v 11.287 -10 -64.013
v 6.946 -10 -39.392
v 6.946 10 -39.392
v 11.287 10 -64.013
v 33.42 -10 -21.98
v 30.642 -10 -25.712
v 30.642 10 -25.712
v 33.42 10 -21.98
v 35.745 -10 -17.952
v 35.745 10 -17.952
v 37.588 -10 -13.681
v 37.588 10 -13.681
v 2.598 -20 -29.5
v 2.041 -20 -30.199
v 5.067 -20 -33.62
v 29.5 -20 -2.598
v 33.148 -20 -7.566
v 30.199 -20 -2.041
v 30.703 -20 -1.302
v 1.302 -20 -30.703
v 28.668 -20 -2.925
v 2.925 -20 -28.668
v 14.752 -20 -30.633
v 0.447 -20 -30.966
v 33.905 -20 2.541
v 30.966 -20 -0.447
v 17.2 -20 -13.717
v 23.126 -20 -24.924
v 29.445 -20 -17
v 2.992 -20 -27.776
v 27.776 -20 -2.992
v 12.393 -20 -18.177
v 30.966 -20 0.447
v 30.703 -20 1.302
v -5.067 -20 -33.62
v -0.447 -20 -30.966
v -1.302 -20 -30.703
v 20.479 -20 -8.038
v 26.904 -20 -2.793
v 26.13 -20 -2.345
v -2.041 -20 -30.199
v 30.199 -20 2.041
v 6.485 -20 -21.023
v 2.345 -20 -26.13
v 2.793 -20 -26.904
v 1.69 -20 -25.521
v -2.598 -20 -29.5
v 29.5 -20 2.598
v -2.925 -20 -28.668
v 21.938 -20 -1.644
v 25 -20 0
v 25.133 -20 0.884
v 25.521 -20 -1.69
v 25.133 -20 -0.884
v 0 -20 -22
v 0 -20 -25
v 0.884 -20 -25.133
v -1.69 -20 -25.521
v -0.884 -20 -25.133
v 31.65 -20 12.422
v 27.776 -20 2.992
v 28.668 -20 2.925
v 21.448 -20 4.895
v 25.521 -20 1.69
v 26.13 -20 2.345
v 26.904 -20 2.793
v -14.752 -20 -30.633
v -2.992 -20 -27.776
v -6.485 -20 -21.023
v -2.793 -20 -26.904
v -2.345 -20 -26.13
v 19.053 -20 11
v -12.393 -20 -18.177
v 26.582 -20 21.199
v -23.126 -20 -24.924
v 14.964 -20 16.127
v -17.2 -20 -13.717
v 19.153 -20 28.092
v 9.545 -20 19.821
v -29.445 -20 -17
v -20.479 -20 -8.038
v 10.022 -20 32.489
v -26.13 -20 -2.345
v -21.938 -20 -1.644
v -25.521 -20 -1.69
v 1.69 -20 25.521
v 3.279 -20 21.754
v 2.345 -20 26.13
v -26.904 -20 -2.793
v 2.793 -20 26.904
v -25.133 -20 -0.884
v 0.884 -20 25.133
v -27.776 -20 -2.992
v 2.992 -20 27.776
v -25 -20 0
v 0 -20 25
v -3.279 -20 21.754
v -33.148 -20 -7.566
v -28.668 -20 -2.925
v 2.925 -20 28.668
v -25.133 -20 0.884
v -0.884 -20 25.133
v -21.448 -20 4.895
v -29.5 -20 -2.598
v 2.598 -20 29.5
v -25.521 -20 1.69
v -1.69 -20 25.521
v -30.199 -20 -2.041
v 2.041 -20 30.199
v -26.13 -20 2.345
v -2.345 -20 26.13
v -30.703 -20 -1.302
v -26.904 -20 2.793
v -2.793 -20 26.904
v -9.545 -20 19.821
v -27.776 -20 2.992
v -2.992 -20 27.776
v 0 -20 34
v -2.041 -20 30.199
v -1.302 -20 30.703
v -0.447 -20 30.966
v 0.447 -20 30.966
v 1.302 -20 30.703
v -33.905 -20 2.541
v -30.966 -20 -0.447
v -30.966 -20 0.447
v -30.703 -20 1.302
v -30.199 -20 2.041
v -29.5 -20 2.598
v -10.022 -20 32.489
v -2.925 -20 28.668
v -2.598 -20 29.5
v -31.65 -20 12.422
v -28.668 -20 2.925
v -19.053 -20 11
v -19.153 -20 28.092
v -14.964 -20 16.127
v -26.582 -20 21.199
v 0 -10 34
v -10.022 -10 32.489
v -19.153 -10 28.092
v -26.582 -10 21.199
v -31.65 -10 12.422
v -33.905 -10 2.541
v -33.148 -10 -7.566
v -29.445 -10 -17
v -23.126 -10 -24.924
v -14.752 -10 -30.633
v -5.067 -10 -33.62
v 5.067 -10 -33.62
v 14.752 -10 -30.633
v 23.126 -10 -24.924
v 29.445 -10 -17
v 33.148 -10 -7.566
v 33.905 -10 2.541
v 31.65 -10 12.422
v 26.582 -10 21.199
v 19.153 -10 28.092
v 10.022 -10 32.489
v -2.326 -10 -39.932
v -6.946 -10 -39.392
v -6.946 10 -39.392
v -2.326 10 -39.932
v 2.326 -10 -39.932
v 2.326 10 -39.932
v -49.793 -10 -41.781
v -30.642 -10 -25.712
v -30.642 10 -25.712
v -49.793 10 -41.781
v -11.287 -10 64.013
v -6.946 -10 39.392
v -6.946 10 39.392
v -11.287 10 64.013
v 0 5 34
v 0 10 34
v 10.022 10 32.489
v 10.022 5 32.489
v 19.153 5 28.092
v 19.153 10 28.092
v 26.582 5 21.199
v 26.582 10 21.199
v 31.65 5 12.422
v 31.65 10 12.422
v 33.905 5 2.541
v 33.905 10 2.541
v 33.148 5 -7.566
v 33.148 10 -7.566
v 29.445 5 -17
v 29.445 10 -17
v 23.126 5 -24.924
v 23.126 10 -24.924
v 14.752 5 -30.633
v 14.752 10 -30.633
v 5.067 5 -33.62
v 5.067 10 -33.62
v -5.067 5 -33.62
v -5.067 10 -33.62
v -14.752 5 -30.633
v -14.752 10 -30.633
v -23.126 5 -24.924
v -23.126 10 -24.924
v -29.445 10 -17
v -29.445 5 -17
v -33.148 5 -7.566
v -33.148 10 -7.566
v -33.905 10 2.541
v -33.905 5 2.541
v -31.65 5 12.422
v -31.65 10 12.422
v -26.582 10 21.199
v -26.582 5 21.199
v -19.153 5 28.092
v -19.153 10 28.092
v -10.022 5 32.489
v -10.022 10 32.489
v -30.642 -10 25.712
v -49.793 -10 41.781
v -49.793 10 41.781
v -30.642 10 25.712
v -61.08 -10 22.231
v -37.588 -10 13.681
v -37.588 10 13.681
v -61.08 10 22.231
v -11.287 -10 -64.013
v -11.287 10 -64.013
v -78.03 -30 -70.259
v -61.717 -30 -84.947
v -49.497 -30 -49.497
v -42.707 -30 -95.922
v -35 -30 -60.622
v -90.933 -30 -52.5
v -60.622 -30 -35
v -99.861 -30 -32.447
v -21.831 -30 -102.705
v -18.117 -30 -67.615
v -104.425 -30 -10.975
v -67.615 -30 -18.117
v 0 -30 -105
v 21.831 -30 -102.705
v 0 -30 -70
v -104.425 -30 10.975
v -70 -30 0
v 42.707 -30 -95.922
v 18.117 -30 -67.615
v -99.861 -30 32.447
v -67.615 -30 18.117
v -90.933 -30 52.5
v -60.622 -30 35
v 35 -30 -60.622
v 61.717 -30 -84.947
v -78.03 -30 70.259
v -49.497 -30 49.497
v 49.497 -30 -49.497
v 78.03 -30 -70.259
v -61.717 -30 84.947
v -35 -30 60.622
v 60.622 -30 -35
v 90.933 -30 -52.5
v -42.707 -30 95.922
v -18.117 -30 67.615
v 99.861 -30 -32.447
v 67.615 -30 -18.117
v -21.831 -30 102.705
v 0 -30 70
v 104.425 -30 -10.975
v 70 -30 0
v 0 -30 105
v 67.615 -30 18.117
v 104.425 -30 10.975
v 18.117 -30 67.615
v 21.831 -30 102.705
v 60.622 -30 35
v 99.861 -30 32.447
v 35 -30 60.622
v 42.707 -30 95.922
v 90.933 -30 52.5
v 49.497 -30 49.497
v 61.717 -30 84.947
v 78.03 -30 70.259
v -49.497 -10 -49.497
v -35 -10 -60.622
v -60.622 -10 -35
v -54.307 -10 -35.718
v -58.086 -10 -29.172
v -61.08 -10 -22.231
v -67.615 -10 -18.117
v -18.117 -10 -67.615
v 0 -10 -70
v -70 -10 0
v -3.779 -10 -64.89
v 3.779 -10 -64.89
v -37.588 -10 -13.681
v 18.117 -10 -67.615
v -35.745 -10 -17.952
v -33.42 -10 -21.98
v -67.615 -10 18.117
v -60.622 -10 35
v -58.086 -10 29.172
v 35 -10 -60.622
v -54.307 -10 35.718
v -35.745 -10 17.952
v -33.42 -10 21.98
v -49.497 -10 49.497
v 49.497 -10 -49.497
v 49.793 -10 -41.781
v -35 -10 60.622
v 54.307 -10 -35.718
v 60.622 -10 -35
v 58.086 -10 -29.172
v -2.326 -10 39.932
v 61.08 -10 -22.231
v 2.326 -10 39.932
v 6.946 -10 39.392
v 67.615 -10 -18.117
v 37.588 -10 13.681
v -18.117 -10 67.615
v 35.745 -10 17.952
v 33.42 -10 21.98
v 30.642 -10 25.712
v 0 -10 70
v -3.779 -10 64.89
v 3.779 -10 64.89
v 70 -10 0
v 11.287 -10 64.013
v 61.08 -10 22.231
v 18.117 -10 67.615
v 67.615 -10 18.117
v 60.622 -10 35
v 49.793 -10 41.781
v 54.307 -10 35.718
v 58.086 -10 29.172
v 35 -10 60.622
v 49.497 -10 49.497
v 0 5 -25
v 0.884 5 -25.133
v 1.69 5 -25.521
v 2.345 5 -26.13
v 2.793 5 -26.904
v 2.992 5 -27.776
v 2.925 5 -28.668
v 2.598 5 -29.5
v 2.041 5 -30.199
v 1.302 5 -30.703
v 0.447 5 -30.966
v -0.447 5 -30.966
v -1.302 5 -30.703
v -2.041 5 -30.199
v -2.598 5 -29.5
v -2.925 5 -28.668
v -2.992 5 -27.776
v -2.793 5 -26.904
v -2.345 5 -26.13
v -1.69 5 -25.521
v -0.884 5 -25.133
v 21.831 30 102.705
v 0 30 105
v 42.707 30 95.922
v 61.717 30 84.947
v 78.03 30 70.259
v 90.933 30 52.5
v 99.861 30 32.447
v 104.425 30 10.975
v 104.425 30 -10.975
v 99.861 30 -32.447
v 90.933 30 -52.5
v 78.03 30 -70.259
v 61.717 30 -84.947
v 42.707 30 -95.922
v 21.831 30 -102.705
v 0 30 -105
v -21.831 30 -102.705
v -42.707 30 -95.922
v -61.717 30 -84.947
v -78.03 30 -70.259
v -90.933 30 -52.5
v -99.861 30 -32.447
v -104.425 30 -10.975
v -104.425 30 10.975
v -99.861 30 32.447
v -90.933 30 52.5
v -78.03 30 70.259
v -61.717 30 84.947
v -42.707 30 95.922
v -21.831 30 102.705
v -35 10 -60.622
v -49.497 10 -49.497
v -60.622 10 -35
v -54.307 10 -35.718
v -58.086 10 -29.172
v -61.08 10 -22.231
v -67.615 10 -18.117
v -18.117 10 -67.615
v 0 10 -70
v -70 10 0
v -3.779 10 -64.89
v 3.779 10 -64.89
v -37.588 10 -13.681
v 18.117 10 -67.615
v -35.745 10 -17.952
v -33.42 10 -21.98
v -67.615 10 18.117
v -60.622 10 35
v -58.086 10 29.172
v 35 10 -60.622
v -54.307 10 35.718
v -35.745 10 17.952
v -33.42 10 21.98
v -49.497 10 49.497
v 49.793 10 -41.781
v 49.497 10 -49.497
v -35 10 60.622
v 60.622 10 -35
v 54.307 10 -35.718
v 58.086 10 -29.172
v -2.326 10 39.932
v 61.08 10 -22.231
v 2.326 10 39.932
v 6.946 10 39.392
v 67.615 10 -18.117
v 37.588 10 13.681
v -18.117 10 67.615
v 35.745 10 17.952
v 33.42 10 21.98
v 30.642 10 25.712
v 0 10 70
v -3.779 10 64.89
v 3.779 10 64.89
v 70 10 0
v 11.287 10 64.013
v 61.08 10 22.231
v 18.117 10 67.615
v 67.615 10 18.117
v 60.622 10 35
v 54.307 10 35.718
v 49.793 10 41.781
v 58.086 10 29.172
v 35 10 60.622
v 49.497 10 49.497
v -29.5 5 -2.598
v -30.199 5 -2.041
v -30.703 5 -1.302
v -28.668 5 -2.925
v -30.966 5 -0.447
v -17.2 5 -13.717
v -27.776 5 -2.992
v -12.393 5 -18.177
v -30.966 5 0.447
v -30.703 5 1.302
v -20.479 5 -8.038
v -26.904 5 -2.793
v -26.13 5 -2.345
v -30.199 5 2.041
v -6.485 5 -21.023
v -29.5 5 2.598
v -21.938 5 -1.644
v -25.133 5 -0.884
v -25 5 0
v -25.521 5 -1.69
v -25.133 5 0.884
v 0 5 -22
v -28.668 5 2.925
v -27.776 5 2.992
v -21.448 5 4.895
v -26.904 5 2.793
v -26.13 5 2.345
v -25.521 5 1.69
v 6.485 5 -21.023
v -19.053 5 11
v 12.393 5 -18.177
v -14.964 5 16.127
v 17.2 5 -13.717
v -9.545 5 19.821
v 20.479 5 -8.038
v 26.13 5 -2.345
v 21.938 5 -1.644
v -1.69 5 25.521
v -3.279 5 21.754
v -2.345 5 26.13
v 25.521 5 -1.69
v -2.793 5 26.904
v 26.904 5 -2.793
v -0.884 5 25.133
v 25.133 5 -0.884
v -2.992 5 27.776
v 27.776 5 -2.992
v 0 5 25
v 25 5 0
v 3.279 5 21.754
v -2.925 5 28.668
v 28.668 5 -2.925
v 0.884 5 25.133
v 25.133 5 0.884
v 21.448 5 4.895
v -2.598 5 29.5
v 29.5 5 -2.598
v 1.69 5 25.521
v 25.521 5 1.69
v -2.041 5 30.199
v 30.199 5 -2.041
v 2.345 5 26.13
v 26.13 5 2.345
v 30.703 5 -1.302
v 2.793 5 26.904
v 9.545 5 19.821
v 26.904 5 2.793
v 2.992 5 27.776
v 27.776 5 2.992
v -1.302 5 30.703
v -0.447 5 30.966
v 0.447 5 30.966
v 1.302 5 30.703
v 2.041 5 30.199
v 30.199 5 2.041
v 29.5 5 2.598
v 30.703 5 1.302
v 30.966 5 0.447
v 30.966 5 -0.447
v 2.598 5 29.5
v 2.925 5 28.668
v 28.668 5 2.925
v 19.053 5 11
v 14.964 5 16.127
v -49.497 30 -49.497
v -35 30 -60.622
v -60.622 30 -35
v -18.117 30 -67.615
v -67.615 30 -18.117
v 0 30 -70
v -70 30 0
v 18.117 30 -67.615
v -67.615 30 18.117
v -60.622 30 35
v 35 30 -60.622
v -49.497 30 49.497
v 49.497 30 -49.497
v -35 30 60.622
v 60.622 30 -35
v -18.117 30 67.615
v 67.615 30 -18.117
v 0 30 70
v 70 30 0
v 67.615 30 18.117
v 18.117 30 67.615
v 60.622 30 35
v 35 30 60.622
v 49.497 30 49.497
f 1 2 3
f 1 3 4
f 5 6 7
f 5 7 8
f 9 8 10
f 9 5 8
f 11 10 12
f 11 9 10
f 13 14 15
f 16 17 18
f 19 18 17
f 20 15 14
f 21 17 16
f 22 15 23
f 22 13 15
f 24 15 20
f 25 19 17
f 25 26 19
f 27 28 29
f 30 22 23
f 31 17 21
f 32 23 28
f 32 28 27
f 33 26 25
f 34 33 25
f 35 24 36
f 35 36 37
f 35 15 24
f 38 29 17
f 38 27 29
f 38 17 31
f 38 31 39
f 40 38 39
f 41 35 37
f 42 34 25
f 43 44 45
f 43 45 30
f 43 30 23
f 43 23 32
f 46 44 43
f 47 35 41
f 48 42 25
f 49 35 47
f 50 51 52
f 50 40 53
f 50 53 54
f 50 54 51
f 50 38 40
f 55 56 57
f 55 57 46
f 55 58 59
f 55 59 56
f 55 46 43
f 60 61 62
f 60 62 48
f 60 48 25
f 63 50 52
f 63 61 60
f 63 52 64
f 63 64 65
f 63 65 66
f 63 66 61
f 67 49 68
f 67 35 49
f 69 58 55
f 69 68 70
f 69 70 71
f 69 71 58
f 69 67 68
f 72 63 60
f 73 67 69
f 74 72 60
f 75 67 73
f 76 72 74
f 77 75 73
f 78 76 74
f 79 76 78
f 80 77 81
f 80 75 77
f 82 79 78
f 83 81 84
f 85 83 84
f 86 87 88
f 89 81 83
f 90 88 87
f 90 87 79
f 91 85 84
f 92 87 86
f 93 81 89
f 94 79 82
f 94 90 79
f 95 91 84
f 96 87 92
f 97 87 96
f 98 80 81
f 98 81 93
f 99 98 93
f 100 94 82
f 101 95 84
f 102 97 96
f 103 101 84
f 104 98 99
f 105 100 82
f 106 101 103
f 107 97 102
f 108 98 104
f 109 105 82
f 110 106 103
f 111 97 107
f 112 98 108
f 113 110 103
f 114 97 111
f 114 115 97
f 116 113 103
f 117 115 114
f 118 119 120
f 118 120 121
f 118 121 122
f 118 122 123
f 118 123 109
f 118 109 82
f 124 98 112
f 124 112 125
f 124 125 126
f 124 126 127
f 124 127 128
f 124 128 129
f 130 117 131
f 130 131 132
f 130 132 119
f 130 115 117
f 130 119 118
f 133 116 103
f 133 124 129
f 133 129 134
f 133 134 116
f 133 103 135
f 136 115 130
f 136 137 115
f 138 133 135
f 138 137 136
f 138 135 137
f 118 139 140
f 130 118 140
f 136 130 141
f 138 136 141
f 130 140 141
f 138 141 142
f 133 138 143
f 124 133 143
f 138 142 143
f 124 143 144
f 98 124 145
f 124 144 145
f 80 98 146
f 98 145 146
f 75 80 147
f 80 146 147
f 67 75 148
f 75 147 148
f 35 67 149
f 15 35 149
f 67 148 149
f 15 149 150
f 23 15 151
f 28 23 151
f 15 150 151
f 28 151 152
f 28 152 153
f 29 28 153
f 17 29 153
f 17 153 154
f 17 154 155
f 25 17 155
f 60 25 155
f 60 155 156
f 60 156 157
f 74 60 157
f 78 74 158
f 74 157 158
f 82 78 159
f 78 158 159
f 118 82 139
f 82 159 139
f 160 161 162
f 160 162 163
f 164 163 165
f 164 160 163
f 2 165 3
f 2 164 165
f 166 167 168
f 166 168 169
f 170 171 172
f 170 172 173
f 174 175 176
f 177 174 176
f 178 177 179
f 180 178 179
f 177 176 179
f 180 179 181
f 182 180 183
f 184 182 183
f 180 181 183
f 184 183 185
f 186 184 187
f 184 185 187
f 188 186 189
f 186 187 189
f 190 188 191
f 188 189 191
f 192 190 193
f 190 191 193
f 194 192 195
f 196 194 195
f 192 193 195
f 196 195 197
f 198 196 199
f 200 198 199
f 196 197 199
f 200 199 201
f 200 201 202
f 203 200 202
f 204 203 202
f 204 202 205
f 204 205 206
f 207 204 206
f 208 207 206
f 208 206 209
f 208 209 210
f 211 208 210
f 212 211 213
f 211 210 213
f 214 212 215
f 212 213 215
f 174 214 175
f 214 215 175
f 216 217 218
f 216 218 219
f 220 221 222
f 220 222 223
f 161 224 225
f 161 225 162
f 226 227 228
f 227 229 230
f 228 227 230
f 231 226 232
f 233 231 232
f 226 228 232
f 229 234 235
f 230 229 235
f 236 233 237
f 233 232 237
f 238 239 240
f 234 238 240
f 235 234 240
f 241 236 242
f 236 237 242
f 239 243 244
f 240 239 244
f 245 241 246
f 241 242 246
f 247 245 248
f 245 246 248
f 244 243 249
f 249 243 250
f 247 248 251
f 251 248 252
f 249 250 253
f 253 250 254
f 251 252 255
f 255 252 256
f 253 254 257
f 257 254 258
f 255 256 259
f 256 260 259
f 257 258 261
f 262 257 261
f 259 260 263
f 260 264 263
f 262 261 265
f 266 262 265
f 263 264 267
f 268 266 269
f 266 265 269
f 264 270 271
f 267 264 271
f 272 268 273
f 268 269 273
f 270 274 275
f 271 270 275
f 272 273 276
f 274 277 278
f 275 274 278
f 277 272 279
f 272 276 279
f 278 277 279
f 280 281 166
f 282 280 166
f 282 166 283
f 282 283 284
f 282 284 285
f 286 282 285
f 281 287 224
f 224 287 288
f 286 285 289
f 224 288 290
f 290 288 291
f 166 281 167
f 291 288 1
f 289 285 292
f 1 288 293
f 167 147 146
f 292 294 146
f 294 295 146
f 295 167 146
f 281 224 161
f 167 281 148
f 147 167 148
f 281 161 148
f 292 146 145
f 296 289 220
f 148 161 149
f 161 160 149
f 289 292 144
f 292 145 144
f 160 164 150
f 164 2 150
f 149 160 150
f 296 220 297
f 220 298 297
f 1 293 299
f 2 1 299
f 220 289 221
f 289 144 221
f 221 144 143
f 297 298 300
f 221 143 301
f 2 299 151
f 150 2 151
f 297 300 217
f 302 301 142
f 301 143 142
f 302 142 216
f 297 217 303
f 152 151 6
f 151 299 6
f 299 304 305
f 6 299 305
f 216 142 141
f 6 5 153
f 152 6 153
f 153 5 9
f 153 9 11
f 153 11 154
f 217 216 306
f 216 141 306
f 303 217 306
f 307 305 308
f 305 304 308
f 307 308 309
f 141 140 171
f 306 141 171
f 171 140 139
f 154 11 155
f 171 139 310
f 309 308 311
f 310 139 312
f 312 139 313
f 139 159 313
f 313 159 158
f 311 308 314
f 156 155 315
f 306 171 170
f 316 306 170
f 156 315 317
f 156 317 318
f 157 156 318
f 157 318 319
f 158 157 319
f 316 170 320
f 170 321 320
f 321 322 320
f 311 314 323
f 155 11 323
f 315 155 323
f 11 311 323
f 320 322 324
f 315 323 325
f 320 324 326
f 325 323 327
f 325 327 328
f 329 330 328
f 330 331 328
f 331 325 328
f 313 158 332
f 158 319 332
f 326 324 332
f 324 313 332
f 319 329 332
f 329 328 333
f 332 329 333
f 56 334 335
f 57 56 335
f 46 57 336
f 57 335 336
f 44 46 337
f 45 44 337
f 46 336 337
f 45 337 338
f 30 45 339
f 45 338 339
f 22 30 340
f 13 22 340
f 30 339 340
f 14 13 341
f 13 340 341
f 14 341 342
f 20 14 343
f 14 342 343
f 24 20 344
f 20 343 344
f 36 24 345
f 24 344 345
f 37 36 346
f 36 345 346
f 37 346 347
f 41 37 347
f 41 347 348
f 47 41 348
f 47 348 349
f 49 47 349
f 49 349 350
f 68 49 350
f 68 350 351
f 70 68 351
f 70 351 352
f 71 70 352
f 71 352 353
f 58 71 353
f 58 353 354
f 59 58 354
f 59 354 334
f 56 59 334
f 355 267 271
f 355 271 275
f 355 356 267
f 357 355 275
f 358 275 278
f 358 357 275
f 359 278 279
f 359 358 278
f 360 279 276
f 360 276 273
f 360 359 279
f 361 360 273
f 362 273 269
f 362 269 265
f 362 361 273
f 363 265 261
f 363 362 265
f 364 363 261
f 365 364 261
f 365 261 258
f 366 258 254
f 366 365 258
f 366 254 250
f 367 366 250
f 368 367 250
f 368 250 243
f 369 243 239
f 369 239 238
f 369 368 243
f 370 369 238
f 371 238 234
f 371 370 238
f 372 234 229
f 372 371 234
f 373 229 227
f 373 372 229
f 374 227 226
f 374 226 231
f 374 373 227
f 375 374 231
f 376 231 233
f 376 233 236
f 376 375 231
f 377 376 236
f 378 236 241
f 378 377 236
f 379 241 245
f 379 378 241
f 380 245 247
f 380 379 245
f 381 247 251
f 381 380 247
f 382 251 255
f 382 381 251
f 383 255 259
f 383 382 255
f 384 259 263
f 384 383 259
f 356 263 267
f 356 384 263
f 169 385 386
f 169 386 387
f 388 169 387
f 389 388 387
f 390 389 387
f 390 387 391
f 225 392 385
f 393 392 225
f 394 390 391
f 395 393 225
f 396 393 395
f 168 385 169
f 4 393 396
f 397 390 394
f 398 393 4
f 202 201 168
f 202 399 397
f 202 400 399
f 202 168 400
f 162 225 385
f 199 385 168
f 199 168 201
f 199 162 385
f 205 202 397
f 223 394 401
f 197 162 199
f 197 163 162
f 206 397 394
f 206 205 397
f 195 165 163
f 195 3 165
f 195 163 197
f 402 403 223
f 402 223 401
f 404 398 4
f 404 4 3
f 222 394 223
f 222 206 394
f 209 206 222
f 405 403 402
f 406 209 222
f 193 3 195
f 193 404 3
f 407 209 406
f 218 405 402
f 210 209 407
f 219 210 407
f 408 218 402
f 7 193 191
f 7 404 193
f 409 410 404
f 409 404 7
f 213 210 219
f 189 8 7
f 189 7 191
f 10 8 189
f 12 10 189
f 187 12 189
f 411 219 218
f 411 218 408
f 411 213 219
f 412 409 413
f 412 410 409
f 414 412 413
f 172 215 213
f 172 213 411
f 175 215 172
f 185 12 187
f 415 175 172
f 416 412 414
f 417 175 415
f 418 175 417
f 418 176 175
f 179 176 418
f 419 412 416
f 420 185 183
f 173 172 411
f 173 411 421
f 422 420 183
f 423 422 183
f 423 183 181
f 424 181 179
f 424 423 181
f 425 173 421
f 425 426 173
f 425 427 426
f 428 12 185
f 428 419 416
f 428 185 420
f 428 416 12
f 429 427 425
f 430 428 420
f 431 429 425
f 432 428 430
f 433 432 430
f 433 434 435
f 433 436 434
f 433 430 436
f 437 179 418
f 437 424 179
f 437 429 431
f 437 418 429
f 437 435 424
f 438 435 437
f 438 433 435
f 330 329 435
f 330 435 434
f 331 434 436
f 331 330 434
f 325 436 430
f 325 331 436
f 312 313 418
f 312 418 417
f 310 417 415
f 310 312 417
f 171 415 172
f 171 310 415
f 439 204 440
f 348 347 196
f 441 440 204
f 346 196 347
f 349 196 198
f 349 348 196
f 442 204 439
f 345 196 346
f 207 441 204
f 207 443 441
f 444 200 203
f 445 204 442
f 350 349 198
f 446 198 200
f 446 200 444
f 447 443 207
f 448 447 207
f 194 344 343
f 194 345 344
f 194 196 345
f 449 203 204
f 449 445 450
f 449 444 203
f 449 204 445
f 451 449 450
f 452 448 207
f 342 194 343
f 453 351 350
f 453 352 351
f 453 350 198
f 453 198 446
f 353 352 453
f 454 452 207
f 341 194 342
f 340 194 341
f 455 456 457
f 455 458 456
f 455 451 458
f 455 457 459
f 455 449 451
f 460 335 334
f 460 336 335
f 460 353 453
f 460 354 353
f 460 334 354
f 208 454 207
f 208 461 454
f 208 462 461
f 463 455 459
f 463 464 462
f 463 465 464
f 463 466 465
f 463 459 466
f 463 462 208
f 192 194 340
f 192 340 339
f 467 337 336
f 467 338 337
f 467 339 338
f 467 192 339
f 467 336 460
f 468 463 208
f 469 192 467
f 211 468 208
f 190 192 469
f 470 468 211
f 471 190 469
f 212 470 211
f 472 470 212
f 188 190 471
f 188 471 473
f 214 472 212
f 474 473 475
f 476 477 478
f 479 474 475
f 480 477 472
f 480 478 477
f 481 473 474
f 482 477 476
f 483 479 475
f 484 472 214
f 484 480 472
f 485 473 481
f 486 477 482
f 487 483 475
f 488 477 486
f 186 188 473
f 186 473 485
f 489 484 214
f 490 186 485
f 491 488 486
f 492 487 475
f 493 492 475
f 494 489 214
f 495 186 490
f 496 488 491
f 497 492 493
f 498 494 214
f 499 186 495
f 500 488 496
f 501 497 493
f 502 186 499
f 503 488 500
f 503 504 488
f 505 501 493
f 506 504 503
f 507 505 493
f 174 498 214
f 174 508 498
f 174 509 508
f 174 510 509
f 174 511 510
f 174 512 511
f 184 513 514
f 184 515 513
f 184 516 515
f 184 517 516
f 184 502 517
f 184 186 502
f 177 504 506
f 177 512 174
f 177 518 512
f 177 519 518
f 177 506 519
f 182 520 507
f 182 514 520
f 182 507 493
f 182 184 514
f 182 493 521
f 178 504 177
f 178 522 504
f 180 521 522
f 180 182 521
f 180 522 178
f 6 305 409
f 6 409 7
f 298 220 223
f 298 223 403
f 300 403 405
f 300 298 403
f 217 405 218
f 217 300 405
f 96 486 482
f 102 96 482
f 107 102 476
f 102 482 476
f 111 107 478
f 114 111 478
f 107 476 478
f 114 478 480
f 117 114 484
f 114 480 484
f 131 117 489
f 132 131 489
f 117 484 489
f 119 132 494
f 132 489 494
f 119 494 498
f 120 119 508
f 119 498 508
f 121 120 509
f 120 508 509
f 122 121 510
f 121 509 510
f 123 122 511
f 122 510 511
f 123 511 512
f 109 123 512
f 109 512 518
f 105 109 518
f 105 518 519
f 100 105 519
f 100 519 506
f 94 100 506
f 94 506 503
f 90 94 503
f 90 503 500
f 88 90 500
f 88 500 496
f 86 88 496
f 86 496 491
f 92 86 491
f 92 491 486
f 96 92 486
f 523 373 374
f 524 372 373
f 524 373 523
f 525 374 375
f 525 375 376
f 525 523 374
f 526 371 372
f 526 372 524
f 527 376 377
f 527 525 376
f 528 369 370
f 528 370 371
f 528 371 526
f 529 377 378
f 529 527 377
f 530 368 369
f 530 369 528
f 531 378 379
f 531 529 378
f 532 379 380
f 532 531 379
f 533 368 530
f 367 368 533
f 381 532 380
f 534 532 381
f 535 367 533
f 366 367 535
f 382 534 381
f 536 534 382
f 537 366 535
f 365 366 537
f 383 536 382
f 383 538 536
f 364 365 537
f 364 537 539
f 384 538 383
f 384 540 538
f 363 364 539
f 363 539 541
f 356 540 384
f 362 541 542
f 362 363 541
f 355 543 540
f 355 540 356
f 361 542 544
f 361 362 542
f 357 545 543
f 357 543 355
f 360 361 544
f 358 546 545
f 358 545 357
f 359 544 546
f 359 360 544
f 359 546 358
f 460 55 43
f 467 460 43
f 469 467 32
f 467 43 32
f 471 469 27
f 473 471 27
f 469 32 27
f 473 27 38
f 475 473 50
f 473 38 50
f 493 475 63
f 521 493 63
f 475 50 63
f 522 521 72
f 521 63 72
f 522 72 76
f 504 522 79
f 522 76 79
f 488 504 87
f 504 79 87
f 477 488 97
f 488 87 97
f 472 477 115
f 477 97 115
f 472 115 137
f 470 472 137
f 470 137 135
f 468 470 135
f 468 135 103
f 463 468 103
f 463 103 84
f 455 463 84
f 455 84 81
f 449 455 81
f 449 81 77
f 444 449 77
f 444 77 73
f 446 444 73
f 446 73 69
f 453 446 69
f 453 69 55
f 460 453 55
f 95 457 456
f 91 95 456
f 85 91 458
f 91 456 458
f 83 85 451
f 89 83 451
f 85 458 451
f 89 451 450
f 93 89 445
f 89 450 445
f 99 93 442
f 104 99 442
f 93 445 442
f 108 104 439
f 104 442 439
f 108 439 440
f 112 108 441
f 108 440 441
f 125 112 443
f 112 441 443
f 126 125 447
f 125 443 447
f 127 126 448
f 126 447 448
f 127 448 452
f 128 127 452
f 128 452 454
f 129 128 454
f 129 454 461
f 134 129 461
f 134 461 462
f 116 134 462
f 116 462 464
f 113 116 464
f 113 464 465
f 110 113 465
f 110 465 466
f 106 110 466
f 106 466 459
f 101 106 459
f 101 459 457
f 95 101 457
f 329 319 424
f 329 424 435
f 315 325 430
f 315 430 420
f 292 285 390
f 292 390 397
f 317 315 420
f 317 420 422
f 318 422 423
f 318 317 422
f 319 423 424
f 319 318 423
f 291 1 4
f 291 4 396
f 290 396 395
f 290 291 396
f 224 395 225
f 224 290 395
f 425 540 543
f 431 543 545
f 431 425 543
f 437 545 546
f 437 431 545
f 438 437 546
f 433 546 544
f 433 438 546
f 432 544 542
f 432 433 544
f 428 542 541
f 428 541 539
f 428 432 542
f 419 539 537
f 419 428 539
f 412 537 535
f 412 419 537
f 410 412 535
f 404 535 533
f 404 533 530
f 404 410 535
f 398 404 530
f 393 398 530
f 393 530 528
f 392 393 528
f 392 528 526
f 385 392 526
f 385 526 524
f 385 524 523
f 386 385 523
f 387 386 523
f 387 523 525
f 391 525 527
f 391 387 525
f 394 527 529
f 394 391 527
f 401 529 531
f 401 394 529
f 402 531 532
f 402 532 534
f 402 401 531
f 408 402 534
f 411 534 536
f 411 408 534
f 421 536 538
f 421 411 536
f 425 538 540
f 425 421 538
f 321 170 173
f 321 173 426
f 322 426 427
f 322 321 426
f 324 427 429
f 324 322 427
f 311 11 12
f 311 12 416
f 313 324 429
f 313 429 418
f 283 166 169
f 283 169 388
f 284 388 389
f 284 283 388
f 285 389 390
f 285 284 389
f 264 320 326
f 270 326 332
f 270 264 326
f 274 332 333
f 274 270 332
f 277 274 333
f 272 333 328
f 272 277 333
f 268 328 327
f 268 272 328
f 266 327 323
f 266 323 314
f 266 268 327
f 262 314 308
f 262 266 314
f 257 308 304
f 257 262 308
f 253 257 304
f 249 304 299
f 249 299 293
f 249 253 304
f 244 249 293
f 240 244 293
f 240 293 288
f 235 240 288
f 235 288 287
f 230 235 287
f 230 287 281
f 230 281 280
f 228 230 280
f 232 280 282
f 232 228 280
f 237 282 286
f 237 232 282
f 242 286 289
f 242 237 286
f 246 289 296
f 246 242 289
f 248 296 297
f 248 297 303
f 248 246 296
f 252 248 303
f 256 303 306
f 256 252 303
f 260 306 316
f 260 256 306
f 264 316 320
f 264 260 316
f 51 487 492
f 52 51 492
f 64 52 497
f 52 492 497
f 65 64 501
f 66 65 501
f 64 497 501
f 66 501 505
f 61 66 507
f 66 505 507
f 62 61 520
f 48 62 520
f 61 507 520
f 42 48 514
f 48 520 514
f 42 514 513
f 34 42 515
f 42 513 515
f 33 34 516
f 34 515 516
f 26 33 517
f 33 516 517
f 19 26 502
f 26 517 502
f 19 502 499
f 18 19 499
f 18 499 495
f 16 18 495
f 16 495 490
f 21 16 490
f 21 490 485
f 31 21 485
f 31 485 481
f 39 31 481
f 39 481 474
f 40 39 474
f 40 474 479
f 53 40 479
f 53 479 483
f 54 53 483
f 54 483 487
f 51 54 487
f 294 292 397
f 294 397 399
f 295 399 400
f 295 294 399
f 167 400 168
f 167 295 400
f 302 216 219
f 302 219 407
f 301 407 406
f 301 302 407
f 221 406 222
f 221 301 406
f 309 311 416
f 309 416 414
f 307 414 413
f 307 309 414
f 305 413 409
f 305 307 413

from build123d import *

# Parameters (mm, degrees)
SKETCH_1_R               = 70
EXTRUDE_1_DEPTH          = 10
SKETCH_3_R               = 105
SKETCH_3_R_2             = 70
EXTRUDE_3_DEPTH          = 30
SKETCH_6_R               = 34
EXTRUDE_4_DEPTH          = 10
SKETCH_7_R               = 22
CUT_EXTRUDE_1_DEPTH      = 30
CUT_EXTRUDE_2_DEPTH      = 20
PATTERN_CIRCULAR_1_COUNT = 6
SKETCH_10_R              = 3
CUT_EXTRUDE_4_DEPTH      = 30
PATTERN_CIRCULAR_2_COUNT = 4
SKETCH_15_R              = 34
CUT_EXTRUDE_6_DEPTH      = 5


with BuildPart() as part:
    # 草图1 → 凸台-拉伸1 (new, symmetric)
    with BuildSketch(Plane(origin=(0, 0, 0), x_dir=(1, 0, 0), z_dir=(0, 1, 0))):
        with Locations(Location((0, 0, 0), (0, 0, 270))):
            Circle(SKETCH_1_R)
    extrude(amount=EXTRUDE_1_DEPTH, both=True)

    # 草图3 → 凸台-拉伸3 (add, symmetric)
    with BuildSketch(Plane(origin=(0, 0, 0), x_dir=(1, 0, 0), z_dir=(0, 1, 0))):
        with Locations(Location((0, 0, 0), (0, 0, 270))):
            Circle(SKETCH_3_R)
        with Locations(Location((0, 0, 0), (0, 0, 270))):
            Circle(SKETCH_3_R_2, mode=Mode.SUBTRACT)
    extrude(amount=EXTRUDE_3_DEPTH, both=True)

    # 草图6 → 凸台-拉伸4 (add)
    with BuildSketch(Plane.XZ.offset(10)):
        with Locations(Location((0, 0, 0), (0, 0, 90))):
            Circle(SKETCH_6_R)
    extrude(amount=EXTRUDE_4_DEPTH)

    # 草图7 → 切除-拉伸1 (cut)
    with BuildSketch(Plane.XZ.offset(20)):
        with Locations(Location((0, 0, 0), (0, 0, 270))):
            Circle(SKETCH_7_R)
    extrude(amount=-CUT_EXTRUDE_1_DEPTH, mode=Mode.SUBTRACT)

    # 草图8 → 切除-拉伸2 (cut)
    with BuildSketch(Plane.XZ.offset(10)):
        with BuildLine():
            Line((-6.945927107, 39.39231012), (-11.287131548, 64.012503946))
            ThreePointArc((-11.287131548, 64.012503946), (0, 65), (11.287131548, 64.012503946))
            Line((11.287131548, 64.012503946), (6.945927107, 39.39231012))
            ThreePointArc((6.945927107, 39.39231012), (0, 40), (-6.945927107, 39.39231012))
        make_face()
    cut_extrude_2 = extrude(amount=-CUT_EXTRUDE_2_DEPTH, mode=Mode.SUBTRACT)

    # 阵列(圆周)1: 切除-拉伸2 ×6 about axis
    pattern_circular_1_axis = Axis((0, 0, 0), (0, 1, 0))
    for i in range(1, PATTERN_CIRCULAR_1_COUNT):
        add(cut_extrude_2.rotate(pattern_circular_1_axis, i * 360 / PATTERN_CIRCULAR_1_COUNT), mode=Mode.SUBTRACT)

    # 草图10 → 切除-拉伸4 (cut)
    with BuildSketch(Plane(origin=(0, 10, 0), x_dir=(1, 0, 0), z_dir=(0, 1, 0))):
        with Locations(Location((0, 28, 0), (0, 0, 270))):
            Circle(SKETCH_10_R)
    cut_extrude_4 = extrude(amount=-CUT_EXTRUDE_4_DEPTH, mode=Mode.SUBTRACT)

    # 阵列(圆周)2: 切除-拉伸4 ×4 about axis
    pattern_circular_2_axis = Axis((0, 0, 0), (0, 1, 0))
    for i in range(1, PATTERN_CIRCULAR_2_COUNT):
        add(cut_extrude_4.rotate(pattern_circular_2_axis, i * 360 / PATTERN_CIRCULAR_2_COUNT), mode=Mode.SUBTRACT)

    # 草图15 → 切除-拉伸6 (cut)
    with BuildSketch(Plane(origin=(0, 10, 0), x_dir=(1, 0, 0), z_dir=(0, 1, 0))):
        with Locations(Location((0, 0, 0), (0, 0, 270))):
            Circle(SKETCH_15_R)
    extrude(amount=-CUT_EXTRUDE_6_DEPTH, mode=Mode.SUBTRACT)


solid = part.part
